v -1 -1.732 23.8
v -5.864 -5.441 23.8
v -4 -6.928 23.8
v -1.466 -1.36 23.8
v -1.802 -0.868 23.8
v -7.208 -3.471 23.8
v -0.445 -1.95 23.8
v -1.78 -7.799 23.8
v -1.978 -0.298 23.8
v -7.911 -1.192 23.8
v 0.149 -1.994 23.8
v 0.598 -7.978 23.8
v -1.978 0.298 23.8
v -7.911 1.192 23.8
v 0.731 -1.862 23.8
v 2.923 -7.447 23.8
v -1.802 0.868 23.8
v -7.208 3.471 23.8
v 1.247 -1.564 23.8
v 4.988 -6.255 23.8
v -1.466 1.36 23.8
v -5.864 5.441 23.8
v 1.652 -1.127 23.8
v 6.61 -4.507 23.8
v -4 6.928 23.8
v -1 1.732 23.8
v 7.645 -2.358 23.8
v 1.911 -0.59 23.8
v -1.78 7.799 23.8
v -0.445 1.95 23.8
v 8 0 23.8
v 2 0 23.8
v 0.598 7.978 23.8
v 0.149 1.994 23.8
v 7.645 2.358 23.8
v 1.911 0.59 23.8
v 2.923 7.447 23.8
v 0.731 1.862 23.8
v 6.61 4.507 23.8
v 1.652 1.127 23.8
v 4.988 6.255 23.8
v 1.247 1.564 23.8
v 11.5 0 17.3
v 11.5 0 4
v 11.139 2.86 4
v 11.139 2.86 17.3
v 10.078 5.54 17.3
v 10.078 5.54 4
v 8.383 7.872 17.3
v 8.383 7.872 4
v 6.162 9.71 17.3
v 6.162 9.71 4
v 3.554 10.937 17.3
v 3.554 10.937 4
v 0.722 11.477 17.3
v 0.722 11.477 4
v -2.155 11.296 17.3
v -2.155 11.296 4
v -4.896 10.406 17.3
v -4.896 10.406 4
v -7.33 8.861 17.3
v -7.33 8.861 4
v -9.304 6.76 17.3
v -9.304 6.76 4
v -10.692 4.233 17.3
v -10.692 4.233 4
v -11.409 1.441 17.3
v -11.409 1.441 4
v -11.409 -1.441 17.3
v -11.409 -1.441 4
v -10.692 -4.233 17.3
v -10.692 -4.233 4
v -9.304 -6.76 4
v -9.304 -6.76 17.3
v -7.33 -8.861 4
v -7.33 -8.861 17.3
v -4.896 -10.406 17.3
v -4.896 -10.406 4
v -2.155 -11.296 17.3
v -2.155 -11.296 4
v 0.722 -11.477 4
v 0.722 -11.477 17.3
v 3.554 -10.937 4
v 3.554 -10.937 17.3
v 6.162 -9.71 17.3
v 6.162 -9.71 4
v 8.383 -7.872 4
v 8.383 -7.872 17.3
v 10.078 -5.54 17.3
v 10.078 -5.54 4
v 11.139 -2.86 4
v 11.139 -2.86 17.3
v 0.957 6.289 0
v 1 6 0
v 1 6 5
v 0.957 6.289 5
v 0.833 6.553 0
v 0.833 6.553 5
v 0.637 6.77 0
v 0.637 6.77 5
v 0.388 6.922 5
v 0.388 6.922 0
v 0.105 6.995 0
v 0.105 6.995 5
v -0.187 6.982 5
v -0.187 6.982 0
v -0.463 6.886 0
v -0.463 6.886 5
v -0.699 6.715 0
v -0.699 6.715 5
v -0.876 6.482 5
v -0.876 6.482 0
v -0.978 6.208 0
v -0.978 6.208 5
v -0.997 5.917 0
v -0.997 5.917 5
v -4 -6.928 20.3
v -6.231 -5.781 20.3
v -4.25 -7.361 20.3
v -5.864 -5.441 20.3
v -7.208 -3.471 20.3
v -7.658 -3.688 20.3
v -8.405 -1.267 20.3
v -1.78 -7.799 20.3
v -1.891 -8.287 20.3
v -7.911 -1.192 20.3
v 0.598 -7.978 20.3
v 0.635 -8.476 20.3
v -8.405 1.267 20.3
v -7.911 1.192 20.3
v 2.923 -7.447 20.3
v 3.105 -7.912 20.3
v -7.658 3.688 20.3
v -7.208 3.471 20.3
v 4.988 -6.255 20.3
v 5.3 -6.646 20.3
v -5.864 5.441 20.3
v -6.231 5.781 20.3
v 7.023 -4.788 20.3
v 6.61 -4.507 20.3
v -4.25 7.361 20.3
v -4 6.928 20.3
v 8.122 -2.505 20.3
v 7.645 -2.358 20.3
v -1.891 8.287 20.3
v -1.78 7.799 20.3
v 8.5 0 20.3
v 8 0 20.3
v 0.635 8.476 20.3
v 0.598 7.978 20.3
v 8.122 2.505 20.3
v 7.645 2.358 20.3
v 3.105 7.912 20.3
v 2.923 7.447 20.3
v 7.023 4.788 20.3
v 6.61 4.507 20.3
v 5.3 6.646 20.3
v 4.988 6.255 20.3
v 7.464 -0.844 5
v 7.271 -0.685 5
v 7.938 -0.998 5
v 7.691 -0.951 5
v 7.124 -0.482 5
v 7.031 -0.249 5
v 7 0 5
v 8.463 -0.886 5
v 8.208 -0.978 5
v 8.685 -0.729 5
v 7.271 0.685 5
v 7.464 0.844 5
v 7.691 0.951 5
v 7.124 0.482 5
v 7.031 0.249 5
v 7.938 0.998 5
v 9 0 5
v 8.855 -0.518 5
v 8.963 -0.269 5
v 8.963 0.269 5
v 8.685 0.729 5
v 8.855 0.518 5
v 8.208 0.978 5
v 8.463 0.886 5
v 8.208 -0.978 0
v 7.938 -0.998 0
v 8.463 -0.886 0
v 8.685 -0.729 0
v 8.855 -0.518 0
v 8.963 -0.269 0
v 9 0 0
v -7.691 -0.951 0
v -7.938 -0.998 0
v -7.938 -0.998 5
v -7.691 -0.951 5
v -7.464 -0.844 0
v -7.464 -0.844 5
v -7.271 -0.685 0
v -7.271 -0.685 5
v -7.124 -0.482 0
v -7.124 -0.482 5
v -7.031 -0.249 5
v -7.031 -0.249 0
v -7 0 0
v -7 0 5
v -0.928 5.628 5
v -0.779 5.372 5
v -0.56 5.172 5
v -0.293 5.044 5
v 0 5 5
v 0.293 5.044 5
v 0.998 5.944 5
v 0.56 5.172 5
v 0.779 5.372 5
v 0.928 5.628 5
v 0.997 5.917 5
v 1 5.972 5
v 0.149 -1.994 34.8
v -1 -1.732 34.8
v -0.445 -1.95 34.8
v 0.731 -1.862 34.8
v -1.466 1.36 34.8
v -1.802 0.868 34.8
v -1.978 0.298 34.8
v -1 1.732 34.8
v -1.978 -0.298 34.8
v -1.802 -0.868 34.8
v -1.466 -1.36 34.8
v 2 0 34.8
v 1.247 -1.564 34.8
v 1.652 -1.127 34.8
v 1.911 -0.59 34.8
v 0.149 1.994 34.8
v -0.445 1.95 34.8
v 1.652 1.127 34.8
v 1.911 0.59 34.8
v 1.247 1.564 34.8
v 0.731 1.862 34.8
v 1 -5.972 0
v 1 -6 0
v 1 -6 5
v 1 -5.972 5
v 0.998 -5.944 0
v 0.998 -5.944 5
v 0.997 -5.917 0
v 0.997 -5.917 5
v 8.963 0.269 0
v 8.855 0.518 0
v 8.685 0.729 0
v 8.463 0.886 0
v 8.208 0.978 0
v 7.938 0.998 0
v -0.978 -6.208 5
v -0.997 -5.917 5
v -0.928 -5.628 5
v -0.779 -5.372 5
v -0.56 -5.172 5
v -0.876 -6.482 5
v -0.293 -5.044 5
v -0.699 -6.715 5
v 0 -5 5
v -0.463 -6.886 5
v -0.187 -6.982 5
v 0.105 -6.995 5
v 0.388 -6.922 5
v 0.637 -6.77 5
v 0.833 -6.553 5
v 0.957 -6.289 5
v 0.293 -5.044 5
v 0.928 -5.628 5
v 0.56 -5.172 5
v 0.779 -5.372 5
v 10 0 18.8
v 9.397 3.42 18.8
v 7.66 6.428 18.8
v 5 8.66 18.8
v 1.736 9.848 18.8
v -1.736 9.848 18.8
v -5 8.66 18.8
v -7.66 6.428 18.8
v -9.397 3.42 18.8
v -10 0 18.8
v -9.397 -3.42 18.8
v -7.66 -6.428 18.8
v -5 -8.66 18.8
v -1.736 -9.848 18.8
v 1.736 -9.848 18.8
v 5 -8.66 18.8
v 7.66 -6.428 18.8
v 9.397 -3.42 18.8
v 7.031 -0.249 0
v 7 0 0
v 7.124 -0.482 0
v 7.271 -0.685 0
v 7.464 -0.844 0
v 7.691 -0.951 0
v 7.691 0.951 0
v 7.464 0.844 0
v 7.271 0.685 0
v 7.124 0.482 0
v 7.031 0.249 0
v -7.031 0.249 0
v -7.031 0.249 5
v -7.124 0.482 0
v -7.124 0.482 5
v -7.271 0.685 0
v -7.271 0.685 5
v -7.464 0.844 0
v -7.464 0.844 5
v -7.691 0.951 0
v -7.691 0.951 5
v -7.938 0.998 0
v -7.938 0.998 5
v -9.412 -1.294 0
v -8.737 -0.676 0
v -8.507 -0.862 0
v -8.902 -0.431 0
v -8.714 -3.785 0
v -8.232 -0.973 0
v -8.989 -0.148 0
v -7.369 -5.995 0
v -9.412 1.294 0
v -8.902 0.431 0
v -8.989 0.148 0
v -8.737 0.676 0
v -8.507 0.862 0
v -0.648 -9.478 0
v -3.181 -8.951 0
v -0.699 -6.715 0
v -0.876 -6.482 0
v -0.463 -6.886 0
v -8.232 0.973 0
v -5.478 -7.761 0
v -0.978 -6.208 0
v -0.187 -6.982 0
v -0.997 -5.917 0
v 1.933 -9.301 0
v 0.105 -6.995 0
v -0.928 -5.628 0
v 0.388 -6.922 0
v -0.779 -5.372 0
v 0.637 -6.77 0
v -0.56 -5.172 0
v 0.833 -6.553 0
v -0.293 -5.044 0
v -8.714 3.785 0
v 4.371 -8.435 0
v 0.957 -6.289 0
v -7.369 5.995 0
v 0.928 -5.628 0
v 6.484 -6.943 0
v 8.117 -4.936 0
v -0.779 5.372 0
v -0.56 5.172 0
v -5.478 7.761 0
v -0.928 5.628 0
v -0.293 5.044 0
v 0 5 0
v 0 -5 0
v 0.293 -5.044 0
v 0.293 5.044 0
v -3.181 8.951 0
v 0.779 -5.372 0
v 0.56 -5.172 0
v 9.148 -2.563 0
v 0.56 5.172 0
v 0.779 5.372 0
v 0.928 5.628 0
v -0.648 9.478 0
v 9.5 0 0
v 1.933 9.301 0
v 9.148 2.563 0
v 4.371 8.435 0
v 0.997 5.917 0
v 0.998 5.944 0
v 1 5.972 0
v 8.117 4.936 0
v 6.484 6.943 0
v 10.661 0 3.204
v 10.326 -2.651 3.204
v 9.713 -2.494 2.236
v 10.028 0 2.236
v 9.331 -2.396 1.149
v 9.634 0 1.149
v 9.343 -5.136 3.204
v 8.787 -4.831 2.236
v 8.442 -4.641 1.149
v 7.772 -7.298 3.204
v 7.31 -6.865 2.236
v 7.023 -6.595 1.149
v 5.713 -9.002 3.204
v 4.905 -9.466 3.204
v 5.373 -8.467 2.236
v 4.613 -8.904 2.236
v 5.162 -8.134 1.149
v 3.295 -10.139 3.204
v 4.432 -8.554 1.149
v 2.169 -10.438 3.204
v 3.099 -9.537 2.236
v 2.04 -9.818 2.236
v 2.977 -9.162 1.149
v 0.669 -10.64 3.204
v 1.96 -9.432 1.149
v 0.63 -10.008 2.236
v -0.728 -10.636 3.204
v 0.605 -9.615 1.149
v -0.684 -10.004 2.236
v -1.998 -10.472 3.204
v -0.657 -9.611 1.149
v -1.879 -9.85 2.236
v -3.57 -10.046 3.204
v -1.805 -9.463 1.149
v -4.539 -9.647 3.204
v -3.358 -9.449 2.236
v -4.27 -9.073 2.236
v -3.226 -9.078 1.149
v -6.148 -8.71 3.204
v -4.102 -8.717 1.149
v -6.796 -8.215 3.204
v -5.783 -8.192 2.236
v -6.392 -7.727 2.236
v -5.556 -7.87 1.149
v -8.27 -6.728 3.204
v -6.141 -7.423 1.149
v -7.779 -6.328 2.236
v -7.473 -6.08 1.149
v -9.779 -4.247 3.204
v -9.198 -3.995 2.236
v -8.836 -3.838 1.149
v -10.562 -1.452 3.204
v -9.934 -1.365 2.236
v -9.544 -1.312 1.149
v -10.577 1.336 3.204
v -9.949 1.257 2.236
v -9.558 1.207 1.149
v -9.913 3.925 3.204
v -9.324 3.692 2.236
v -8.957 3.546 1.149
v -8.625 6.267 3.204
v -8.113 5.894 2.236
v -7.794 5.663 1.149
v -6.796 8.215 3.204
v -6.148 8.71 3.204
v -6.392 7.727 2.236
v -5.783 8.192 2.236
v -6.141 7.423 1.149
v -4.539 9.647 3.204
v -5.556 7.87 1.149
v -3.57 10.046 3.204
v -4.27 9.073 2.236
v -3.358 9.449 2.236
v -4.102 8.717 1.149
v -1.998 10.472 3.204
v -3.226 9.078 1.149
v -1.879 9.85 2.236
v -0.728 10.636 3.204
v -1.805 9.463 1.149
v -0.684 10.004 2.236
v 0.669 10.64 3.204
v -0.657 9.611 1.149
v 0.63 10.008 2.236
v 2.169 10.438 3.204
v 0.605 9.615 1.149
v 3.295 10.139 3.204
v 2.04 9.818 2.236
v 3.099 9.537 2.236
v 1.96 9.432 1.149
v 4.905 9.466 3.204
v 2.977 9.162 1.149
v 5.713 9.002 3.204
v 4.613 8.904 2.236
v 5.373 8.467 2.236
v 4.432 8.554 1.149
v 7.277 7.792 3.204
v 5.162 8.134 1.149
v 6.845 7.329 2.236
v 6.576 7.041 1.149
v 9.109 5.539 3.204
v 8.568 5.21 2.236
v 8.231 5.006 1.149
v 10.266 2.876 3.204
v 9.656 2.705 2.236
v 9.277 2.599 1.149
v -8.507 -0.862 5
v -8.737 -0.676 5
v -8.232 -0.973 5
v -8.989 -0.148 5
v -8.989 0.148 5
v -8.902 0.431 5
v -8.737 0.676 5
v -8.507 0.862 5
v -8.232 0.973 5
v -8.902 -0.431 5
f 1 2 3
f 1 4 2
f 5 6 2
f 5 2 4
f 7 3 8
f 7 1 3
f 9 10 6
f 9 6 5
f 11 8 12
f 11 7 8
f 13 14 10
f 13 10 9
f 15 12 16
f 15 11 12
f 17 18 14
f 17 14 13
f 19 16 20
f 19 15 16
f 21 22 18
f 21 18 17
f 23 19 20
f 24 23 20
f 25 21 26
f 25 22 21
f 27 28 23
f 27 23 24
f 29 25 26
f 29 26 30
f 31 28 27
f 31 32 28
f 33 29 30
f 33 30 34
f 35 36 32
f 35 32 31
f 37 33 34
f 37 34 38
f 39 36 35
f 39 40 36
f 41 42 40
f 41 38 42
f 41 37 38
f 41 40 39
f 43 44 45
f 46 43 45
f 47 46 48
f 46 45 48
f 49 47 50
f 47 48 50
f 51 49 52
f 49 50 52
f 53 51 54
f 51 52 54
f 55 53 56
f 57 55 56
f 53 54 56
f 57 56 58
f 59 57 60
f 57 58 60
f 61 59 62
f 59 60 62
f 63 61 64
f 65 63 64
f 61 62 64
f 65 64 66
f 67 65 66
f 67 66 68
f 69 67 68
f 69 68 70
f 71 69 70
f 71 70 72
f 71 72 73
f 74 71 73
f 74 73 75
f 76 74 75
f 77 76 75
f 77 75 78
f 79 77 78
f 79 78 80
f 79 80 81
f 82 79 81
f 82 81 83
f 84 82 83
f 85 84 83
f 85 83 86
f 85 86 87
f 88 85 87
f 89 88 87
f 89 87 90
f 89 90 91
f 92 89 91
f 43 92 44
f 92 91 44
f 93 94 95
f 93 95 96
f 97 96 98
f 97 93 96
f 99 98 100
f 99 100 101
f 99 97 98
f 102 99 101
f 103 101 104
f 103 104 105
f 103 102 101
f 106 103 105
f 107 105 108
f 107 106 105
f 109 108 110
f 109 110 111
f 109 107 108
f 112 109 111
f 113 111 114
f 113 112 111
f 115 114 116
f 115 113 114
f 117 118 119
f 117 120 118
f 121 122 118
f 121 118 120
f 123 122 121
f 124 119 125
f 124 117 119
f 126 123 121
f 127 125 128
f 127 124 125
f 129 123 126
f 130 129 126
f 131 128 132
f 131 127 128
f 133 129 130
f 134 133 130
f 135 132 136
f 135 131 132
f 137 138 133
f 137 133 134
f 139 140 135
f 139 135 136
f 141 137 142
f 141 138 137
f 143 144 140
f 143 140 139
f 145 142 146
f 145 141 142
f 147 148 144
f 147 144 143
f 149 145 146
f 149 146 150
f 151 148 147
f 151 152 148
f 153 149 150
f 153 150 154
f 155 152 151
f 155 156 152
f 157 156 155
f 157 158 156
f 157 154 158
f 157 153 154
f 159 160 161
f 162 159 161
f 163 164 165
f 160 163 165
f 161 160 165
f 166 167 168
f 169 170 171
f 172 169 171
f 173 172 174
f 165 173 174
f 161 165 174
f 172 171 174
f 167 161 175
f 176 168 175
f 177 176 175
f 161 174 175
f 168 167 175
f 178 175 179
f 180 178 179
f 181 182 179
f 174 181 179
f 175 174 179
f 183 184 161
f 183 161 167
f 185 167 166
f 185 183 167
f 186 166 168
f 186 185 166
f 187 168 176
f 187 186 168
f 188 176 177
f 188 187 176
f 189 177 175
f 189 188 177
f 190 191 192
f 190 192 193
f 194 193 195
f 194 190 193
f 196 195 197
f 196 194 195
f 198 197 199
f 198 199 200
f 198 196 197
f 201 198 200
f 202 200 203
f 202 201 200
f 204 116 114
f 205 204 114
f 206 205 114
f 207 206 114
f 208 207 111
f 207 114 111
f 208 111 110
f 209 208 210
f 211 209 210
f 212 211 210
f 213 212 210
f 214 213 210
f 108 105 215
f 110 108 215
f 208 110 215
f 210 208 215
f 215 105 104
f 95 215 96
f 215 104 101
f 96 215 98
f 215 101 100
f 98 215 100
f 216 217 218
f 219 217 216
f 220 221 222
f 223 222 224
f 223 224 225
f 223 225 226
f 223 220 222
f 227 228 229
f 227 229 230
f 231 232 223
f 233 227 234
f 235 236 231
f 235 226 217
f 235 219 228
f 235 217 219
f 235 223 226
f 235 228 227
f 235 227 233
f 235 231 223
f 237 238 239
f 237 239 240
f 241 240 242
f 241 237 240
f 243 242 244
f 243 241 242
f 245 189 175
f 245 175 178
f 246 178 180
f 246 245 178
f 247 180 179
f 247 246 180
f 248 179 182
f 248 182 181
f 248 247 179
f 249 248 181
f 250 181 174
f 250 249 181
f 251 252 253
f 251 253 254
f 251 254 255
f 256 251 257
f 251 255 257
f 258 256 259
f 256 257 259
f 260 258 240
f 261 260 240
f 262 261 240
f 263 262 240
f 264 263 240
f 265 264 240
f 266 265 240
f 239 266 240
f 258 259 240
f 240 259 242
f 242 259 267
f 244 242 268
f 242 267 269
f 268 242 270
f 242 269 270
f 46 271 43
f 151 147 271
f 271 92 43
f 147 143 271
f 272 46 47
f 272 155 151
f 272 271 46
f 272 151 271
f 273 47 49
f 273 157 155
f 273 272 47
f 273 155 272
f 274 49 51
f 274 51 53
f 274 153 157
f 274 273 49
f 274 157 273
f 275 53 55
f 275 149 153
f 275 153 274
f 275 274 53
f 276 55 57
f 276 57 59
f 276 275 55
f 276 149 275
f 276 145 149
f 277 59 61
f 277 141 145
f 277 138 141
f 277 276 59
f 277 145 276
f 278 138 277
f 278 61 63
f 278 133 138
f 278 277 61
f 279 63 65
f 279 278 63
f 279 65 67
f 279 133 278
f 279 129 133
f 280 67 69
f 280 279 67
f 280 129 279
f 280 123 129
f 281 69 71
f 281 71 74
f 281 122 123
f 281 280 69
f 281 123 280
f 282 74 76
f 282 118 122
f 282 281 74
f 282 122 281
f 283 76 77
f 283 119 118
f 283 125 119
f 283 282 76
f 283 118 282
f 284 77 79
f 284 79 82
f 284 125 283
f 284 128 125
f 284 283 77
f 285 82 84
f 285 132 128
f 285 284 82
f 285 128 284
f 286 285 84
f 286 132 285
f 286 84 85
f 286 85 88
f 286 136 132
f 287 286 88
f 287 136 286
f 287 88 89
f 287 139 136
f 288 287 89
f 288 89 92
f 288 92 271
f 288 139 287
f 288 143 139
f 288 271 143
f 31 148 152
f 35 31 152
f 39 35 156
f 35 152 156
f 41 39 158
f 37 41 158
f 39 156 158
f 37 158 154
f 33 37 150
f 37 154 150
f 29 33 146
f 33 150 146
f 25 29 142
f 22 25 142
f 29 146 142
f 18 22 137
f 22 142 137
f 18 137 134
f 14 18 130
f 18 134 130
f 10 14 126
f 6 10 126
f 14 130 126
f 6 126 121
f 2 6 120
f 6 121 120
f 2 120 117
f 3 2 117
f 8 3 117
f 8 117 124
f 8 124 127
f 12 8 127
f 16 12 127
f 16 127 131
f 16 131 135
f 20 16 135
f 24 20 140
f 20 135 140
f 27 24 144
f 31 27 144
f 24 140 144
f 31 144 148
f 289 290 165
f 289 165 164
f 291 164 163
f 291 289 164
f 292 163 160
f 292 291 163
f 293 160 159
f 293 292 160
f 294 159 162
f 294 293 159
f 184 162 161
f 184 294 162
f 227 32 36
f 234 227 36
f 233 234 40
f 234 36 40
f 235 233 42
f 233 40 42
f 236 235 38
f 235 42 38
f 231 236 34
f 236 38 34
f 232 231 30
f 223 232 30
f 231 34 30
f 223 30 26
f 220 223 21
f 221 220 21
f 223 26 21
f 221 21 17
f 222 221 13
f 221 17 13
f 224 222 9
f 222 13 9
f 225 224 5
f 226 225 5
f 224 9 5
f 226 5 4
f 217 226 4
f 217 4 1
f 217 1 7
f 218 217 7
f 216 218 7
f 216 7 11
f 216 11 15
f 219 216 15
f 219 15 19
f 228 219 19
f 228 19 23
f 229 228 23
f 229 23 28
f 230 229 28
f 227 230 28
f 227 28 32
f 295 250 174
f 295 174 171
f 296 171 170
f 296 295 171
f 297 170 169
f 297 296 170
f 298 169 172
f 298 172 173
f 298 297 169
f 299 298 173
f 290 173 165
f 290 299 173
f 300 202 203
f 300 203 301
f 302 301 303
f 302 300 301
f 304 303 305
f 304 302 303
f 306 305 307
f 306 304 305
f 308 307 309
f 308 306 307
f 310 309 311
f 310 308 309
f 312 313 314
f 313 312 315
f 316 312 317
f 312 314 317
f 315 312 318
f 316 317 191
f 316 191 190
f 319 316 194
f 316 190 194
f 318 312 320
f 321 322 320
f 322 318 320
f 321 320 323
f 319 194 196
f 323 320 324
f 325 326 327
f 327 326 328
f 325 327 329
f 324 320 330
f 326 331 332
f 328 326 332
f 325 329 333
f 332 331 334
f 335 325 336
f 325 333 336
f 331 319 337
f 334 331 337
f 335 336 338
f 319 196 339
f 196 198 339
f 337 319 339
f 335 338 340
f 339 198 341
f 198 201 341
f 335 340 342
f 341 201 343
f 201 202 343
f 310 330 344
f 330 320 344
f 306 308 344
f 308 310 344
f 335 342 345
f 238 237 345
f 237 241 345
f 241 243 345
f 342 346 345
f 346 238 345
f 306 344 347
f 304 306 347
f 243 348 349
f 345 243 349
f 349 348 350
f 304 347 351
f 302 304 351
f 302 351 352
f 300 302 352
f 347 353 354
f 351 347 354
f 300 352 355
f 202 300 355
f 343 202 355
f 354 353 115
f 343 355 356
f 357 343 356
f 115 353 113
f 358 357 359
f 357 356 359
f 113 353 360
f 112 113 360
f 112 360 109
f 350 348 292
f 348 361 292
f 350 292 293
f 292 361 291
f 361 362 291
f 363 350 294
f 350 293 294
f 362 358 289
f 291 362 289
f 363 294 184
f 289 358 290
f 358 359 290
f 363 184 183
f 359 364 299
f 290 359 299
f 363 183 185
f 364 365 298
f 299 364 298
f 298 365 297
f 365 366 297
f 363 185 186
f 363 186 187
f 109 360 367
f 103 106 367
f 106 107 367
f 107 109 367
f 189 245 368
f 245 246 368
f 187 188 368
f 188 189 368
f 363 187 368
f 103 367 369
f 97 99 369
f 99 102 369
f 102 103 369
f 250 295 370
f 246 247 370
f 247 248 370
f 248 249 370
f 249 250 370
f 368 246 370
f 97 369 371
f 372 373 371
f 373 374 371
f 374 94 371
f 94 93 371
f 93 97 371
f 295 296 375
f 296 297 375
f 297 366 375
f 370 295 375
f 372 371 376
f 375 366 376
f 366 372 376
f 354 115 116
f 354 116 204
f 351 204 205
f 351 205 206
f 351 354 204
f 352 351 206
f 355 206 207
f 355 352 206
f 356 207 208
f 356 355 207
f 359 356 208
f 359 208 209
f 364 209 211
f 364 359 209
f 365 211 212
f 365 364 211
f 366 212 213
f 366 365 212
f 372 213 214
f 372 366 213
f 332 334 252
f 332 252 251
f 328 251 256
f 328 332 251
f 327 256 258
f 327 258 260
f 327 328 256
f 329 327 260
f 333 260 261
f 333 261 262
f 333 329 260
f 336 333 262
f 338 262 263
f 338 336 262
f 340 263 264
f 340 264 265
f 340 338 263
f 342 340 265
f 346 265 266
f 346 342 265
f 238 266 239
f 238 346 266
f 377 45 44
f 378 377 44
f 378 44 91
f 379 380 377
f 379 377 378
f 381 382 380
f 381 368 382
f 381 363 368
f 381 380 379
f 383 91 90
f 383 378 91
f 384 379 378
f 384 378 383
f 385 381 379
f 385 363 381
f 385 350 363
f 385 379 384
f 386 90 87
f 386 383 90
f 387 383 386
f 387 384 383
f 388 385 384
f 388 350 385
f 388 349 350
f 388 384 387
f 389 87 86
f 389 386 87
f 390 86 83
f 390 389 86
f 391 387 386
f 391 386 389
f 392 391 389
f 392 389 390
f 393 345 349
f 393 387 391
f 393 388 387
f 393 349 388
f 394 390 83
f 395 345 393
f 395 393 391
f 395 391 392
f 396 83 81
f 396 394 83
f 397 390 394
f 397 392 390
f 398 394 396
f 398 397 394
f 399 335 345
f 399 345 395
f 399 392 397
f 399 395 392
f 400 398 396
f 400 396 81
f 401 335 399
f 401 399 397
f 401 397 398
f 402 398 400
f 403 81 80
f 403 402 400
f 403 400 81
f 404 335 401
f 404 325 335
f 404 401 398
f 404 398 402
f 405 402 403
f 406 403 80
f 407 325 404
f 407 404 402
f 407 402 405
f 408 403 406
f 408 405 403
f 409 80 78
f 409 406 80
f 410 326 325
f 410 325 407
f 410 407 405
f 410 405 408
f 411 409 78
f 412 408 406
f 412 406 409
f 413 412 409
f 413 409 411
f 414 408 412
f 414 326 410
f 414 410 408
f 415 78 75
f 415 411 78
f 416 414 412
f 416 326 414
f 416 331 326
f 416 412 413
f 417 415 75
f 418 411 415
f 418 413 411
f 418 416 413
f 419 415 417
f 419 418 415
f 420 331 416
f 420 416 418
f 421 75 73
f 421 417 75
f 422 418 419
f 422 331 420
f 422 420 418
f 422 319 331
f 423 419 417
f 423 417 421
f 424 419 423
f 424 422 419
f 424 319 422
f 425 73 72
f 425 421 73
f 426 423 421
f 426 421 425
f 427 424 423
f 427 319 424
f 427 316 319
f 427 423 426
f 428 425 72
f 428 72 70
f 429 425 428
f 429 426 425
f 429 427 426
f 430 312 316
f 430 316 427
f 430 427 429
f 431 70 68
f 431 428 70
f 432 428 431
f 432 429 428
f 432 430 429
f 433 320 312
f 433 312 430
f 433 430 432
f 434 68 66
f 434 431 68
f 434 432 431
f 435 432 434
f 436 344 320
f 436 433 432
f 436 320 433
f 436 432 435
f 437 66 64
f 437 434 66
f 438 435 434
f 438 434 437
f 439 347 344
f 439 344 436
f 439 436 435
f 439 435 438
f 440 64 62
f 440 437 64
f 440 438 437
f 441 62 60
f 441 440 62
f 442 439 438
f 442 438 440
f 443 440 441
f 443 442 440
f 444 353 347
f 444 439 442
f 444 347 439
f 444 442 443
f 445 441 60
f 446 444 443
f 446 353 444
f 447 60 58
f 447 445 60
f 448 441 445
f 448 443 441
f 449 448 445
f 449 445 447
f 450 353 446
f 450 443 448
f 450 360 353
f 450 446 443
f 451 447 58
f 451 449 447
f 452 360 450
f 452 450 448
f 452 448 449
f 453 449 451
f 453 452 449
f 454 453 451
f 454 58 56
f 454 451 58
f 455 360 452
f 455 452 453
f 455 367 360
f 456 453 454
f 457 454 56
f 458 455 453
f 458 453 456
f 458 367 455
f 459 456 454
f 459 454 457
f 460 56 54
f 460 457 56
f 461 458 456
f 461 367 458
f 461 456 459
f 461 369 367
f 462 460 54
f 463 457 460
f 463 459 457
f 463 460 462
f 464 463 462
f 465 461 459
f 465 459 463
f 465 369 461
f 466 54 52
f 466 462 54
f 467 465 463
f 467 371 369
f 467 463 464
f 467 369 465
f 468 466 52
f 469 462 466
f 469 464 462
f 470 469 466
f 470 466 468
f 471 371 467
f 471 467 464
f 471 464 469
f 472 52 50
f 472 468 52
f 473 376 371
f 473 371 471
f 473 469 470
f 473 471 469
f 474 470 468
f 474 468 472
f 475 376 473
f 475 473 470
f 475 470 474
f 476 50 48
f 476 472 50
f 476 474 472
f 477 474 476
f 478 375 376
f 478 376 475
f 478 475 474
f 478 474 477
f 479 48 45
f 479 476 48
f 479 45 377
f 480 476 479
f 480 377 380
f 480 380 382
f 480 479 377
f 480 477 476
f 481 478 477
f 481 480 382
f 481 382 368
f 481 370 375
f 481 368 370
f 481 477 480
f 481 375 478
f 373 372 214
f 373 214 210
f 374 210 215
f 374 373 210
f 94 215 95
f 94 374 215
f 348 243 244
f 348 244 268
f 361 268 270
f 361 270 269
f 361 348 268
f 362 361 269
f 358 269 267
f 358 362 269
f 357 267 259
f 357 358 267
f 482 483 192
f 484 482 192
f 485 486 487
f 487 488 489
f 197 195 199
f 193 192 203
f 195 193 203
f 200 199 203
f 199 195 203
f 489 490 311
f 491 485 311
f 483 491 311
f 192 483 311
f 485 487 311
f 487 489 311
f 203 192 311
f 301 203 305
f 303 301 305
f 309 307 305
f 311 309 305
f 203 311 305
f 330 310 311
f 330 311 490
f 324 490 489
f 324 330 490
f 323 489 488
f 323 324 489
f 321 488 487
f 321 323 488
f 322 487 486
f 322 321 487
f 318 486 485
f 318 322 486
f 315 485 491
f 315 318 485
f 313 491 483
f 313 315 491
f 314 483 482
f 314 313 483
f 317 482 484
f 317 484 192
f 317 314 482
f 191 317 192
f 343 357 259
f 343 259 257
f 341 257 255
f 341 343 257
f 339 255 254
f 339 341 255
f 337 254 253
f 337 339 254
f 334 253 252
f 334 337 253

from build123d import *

# Parameters (mm, degrees)
F0_R     = 11.5
F1_DEPTH = 20.3
F2_R     = 11.5
F2_R_2   = 9.5
F3_DEPTH = 4
F5_DEPTH = 5
F6_SIZE  = 3
F7_R     = 2
F8_DEPTH = 14.5
F7_R_2   = 8
F9_DEPTH = 3.5


# Not quite as in the source:
# - a fillet or chamfer that OpenCascade refuses, or shapes differently, is made with other operations: its cross-section is extruded or revolved along the edge and cut away or added


with BuildPart() as f1:
    # F0 (on Top) → F1 (new body)
    with BuildSketch(Plane.XY):
        Circle(F0_R)
        with BuildLine():
            ThreePointArc((-7.9375, 0.9980449639), (0, 8), (7.9375, 0.9980449639))
            ThreePointArc((7.9375, 0.9980449639), (8.6846531969, 0.7288689869), (9, 0))
            ThreePointArc((9, 0), (8.6846531969, -0.7288689869), (7.9375, -0.9980449639))
            ThreePointArc((7.9375, -0.9980449639), (0, -8), (-7.9375, -0.9980449639))
            ThreePointArc((-7.9375, -0.9980449639), (-9, 0), (-7.9375, 0.9980449639))
        make_face(mode=Mode.SUBTRACT)
        with BuildLine():
            ThreePointArc((7.9375, 0.9980449639), (7.9843597113, 0.5), (8, 0))
            ThreePointArc((8, 0), (7.9843597113, -0.5), (7.9375, -0.9980449639))
            ThreePointArc((7.9375, -0.9980449639), (8.6846531969, -0.7288689869), (9, 0))
            ThreePointArc((9, 0), (8.6846531969, 0.7288689869), (7.9375, 0.9980449639))
        make_face()
        with BuildLine():
            ThreePointArc((7, 0), (7.2711310131, 0.6846531969), (7.9375, 0.9980449639))
            ThreePointArc((7.9375, 0.9980449639), (0, 8), (-7.9375, 0.9980449639))
            ThreePointArc((-7.9375, 0.9980449639), (-7.2711310131, 0.6846531969), (-7, 0))
            Line((-7, 0), (-6, 0))
            ThreePointArc((-6, 0), (-4.5814370219, 3.8743302407), (-0.9965217286, 5.9166666667))
            ThreePointArc((-0.9965217286, 5.9166666667), (-0.041702946, 6.9991300537), (1, 6))
            ThreePointArc((1, 6), (0.9991300537, 5.958297054), (0.9965217286, 5.9166666667))
            ThreePointArc((0.9965217286, 5.9166666667), (4.5814370219, 3.8743302407), (6, 0))
            Line((6, 0), (7, 0))
        make_face()
        with BuildLine():
            Line((0, 0), (6, 0))
            ThreePointArc((6, 0), (4.5814370219, 3.8743302407), (0.9965217286, 5.9166666667))
            ThreePointArc((0.9965217286, 5.9166666667), (0.6770032004, 5.2640199278), (0, 5))
            Line((0, 5), (0, 0))
        make_face()
        with BuildLine():
            Line((-6, 0), (0, 0))
            Line((0, 0), (0, 5))
            ThreePointArc((0, 5), (-0.6770032004, 5.2640199278), (-0.9965217286, 5.9166666667))
            ThreePointArc((-0.9965217286, 5.9166666667), (-4.5814370219, 3.8743302407), (-6, 0))
        make_face()
        with BuildLine():
            Line((0, -5), (0, 0))
            Line((0, 0), (-6, 0))
            ThreePointArc((-6, 0), (-4.5814370219, -3.8743302407), (-0.9965217286, -5.9166666667))
            ThreePointArc((-0.9965217286, -5.9166666667), (-0.6770032004, -5.2640199278), (0, -5))
        make_face()
        with BuildLine():
            ThreePointArc((0.9965217286, -5.9166666667), (4.5814370219, -3.8743302407), (6, 0))
            Line((6, 0), (0, 0))
            Line((0, 0), (0, -5))
            ThreePointArc((0, -5), (0.6770032004, -5.2640199278), (0.9965217286, -5.9166666667))
        make_face()
        with BuildLine():
            ThreePointArc((0, 5), (0.6770032004, 5.2640199278), (0.9965217286, 5.9166666667))
            ThreePointArc((0.9965217286, 5.9166666667), (0.5, 5.9791303716), (0, 6))
            Line((0, 6), (0, 5))
        make_face()
        with BuildLine():
            Line((0, 5), (0, 6))
            ThreePointArc((0, 6), (-0.5, 5.9791303716), (-0.9965217286, 5.9166666667))
            ThreePointArc((-0.9965217286, 5.9166666667), (-0.6770032004, 5.2640199278), (0, 5))
        make_face()
        with BuildLine():
            ThreePointArc((0, 6), (0.5, 5.9791303716), (0.9965217286, 5.9166666667))
            ThreePointArc((0.9965217286, 5.9166666667), (0.9991300537, 5.958297054), (1, 6))
            ThreePointArc((1, 6), (-0.041702946, 6.9991300537), (-0.9965217286, 5.9166666667))
            ThreePointArc((-0.9965217286, 5.9166666667), (-0.5, 5.9791303716), (0, 6))
        make_face()
        with BuildLine():
            ThreePointArc((7.9375, -0.9980449639), (7.9843597113, -0.5), (8, 0))
            Line((8, 0), (7, 0))
            ThreePointArc((7, 0), (7.2711310131, -0.6846531969), (7.9375, -0.9980449639))
        make_face()
        with BuildLine():
            Line((7, 0), (8, 0))
            ThreePointArc((8, 0), (7.9843597113, 0.5), (7.9375, 0.9980449639))
            ThreePointArc((7.9375, 0.9980449639), (7.2711310131, 0.6846531969), (7, 0))
        make_face()
        with BuildLine():
            ThreePointArc((-7.9375, -0.9980449639), (0, -8), (7.9375, -0.9980449639))
            ThreePointArc((7.9375, -0.9980449639), (7.2711310131, -0.6846531969), (7, 0))
            Line((7, 0), (6, 0))
            ThreePointArc((6, 0), (4.5814370219, -3.8743302407), (0.9965217286, -5.9166666667))
            ThreePointArc((0.9965217286, -5.9166666667), (0.9991300537, -5.958297054), (1, -6))
            ThreePointArc((1, -6), (-0.041702946, -6.9991300537), (-0.9965217286, -5.9166666667))
            ThreePointArc((-0.9965217286, -5.9166666667), (-4.5814370219, -3.8743302407), (-6, 0))
            Line((-6, 0), (-7, 0))
            ThreePointArc((-7, 0), (-7.2711310131, -0.6846531969), (-7.9375, -0.9980449639))
        make_face()
        with BuildLine():
            ThreePointArc((1, -6), (0.9991300537, -5.958297054), (0.9965217286, -5.9166666667))
            ThreePointArc((0.9965217286, -5.9166666667), (0.5, -5.9791303716), (0, -6))
            ThreePointArc((0, -6), (-0.5, -5.9791303716), (-0.9965217286, -5.9166666667))
            ThreePointArc((-0.9965217286, -5.9166666667), (-0.041702946, -6.9991300537), (1, -6))
        make_face()
        with BuildLine():
            ThreePointArc((0, -6), (0.5, -5.9791303716), (0.9965217286, -5.9166666667))
            ThreePointArc((0.9965217286, -5.9166666667), (0.6770032004, -5.2640199278), (0, -5))
            Line((0, -5), (0, -6))
        make_face()
        with BuildLine():
            ThreePointArc((-0.9965217286, -5.9166666667), (-0.5, -5.9791303716), (0, -6))
            Line((0, -6), (0, -5))
            ThreePointArc((0, -5), (-0.6770032004, -5.2640199278), (-0.9965217286, -5.9166666667))
        make_face()
        with BuildLine():
            ThreePointArc((-8, 0), (-7.9843597113, -0.5), (-7.9375, -0.9980449639))
            ThreePointArc((-7.9375, -0.9980449639), (-7.2711310131, -0.6846531969), (-7, 0))
            Line((-7, 0), (-8, 0))
        make_face()
        with BuildLine():
            ThreePointArc((-8, 0), (-7.9843597113, 0.5), (-7.9375, 0.9980449639))
            ThreePointArc((-7.9375, 0.9980449639), (-9, 0), (-7.9375, -0.9980449639))
            ThreePointArc((-7.9375, -0.9980449639), (-7.9843597113, -0.5), (-8, 0))
        make_face()
        with BuildLine():
            ThreePointArc((-7, 0), (-7.2711310131, 0.6846531969), (-7.9375, 0.9980449639))
            ThreePointArc((-7.9375, 0.9980449639), (-7.9843597113, 0.5), (-8, 0))
            Line((-8, 0), (-7, 0))
        make_face()
    extrude(amount=F1_DEPTH)

    # F2 (on face) → F3 (cut)
    with BuildSketch(Plane(origin=(0, 0, 0), x_dir=(1, 0, 0), z_dir=(0, 0, -1))):
        Circle(F2_R)
        Circle(F2_R_2, mode=Mode.SUBTRACT)
    extrude(amount=-F3_DEPTH, mode=Mode.SUBTRACT)

    # F4: fillet of radius 5 on 1 edges, made by hand

    # F4_s1 → F4_t2 (revolve)
    with BuildSketch(Plane.XZ):
        with BuildLine():
            ThreePointArc((11.5, 4), (10.027864045, 2.2360679775), (9.5, 0))
            Line((9.5, 0), (9.5, 4))
            Line((9.5, 4), (11.5, 4))
        make_face()
    revolve(axis=Axis((0, 0, 4), (0, 0, -1)))

    # F0 (on Top) → F5 (cut)
    with BuildSketch(Plane.XY):
        with BuildLine():
            ThreePointArc((-8, 0), (-7.9843597113, 0.5), (-7.9375, 0.9980449639))
            ThreePointArc((-7.9375, 0.9980449639), (-9, 0), (-7.9375, -0.9980449639))
            ThreePointArc((-7.9375, -0.9980449639), (-7.9843597113, -0.5), (-8, 0))
        make_face()
        with BuildLine():
            ThreePointArc((-8, 0), (-7.9843597113, -0.5), (-7.9375, -0.9980449639))
            ThreePointArc((-7.9375, -0.9980449639), (-7.2711310131, -0.6846531969), (-7, 0))
            Line((-7, 0), (-8, 0))
        make_face()
        with BuildLine():
            ThreePointArc((-7, 0), (-7.2711310131, 0.6846531969), (-7.9375, 0.9980449639))
            ThreePointArc((-7.9375, 0.9980449639), (-7.9843597113, 0.5), (-8, 0))
            Line((-8, 0), (-7, 0))
        make_face()
        with BuildLine():
            ThreePointArc((0, 6), (0.5, 5.9791303716), (0.9965217286, 5.9166666667))
            ThreePointArc((0.9965217286, 5.9166666667), (0.9991300537, 5.958297054), (1, 6))
            ThreePointArc((1, 6), (-0.041702946, 6.9991300537), (-0.9965217286, 5.9166666667))
            ThreePointArc((-0.9965217286, 5.9166666667), (-0.5, 5.9791303716), (0, 6))
        make_face()
        with BuildLine():
            ThreePointArc((0, 5), (0.6770032004, 5.2640199278), (0.9965217286, 5.9166666667))
            ThreePointArc((0.9965217286, 5.9166666667), (0.5, 5.9791303716), (0, 6))
            Line((0, 6), (0, 5))
        make_face()
        with BuildLine():
            Line((0, 5), (0, 6))
            ThreePointArc((0, 6), (-0.5, 5.9791303716), (-0.9965217286, 5.9166666667))
            ThreePointArc((-0.9965217286, 5.9166666667), (-0.6770032004, 5.2640199278), (0, 5))
        make_face()
        with BuildLine():
            ThreePointArc((7.9375, 0.9980449639), (7.9843597113, 0.5), (8, 0))
            ThreePointArc((8, 0), (7.9843597113, -0.5), (7.9375, -0.9980449639))
            ThreePointArc((7.9375, -0.9980449639), (8.6846531969, -0.7288689869), (9, 0))
            ThreePointArc((9, 0), (8.6846531969, 0.7288689869), (7.9375, 0.9980449639))
        make_face()
        with BuildLine():
            ThreePointArc((7.9375, -0.9980449639), (7.9843597113, -0.5), (8, 0))
            Line((8, 0), (7, 0))
            ThreePointArc((7, 0), (7.2711310131, -0.6846531969), (7.9375, -0.9980449639))
        make_face()
        with BuildLine():
            Line((7, 0), (8, 0))
            ThreePointArc((8, 0), (7.9843597113, 0.5), (7.9375, 0.9980449639))
            ThreePointArc((7.9375, 0.9980449639), (7.2711310131, 0.6846531969), (7, 0))
        make_face()
        with BuildLine():
            ThreePointArc((1, -6), (0.9991300537, -5.958297054), (0.9965217286, -5.9166666667))
            ThreePointArc((0.9965217286, -5.9166666667), (0.5, -5.9791303716), (0, -6))
            ThreePointArc((0, -6), (-0.5, -5.9791303716), (-0.9965217286, -5.9166666667))
            ThreePointArc((-0.9965217286, -5.9166666667), (-0.041702946, -6.9991300537), (1, -6))
        make_face()
        with BuildLine():
            ThreePointArc((-0.9965217286, -5.9166666667), (-0.5, -5.9791303716), (0, -6))
            Line((0, -6), (0, -5))
            ThreePointArc((0, -5), (-0.6770032004, -5.2640199278), (-0.9965217286, -5.9166666667))
        make_face()
        with BuildLine():
            ThreePointArc((0, -6), (0.5, -5.9791303716), (0.9965217286, -5.9166666667))
            ThreePointArc((0.9965217286, -5.9166666667), (0.6770032004, -5.2640199278), (0, -5))
            Line((0, -5), (0, -6))
        make_face()
    extrude(amount=F5_DEPTH, mode=Mode.SUBTRACT)

    # F6
    f6_edges = [f1.edges().sort_by_distance(p)[0] for p in [
        (-11.5, 0, 20.3),
    ]]
    chamfer(f6_edges, length=F6_SIZE)

    # F7 (on face) → F8 (join)
    with BuildSketch(Plane.XY.offset(20.3)):
        Circle(F7_R)
    extrude(amount=F8_DEPTH)

    # F7 (on face) → F9 (join)
    with BuildSketch(Plane.XY.offset(20.3)):
        Circle(F7_R_2)
        Circle(F7_R, mode=Mode.SUBTRACT)
    extrude(amount=F9_DEPTH)


solid = f1.part
